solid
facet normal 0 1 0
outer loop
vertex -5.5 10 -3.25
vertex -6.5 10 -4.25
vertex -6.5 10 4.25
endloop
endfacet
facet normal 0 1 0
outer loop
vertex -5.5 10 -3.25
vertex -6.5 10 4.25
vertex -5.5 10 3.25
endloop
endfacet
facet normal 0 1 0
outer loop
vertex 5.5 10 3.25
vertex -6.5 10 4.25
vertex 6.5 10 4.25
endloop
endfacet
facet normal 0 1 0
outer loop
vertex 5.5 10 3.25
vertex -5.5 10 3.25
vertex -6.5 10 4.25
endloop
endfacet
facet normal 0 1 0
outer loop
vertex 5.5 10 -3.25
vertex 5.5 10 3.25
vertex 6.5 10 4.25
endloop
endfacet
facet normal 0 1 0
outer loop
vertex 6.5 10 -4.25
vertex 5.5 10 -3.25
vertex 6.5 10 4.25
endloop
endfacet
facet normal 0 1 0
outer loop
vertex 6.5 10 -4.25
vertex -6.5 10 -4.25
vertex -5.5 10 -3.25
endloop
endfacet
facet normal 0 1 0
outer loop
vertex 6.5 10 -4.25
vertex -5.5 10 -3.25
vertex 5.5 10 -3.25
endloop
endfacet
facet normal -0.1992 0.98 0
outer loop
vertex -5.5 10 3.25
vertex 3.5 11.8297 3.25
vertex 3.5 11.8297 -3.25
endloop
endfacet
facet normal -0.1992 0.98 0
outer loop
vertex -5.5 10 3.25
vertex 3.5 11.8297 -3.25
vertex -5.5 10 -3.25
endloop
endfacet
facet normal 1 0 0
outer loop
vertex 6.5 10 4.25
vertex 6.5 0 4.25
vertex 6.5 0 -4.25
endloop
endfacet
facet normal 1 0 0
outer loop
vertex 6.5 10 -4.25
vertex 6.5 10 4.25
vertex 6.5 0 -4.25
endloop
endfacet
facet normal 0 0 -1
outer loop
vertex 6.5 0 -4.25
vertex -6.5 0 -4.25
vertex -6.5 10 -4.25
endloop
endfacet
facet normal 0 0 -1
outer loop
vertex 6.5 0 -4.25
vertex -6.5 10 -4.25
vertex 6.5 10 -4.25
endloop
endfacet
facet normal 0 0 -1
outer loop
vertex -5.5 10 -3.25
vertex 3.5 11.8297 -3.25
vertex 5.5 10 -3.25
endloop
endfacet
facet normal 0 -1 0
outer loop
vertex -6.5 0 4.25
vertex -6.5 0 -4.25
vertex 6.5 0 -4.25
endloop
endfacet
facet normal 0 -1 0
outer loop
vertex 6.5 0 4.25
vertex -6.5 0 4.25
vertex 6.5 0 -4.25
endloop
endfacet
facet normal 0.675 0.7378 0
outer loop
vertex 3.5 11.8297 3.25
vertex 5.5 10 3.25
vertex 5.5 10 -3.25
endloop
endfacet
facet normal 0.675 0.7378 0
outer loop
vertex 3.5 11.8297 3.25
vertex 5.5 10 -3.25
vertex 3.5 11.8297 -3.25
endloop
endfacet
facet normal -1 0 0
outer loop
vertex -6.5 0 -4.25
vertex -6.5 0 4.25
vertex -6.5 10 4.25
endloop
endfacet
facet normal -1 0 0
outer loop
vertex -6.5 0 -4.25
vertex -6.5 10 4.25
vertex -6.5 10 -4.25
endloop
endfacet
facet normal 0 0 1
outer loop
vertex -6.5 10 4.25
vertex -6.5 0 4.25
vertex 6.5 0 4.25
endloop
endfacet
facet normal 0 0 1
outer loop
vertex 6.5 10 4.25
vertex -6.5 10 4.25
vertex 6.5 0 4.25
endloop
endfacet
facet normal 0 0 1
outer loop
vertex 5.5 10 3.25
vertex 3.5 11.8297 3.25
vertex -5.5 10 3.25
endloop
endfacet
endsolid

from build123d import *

# Parameters (mm, degrees)
SKETCH1_W           = 13
SKETCH1_H           = 8.5
BOSS_EXTRUDE1_DEPTH = 10
BOSS_EXTRUDE2_DEPTH = 6.5


with BuildPart() as part:
    # Sketch1 → Boss-Extrude1 (new body)
    with BuildSketch(Plane(origin=(0, 0, 0), x_dir=(1, 0, 0), z_dir=(0, 1, 0))):
        Rectangle(SKETCH1_W, SKETCH1_H)
    extrude(amount=BOSS_EXTRUDE1_DEPTH)

    # Sketch2 → Boss-Extrude2 (add)
    with BuildSketch(Plane.XY.offset(3.25)):
        Polygon((-5.5, 10), (5.5, 10), (3.5, 11.829740684), align=None)
    extrude(amount=-BOSS_EXTRUDE2_DEPTH)


solid = part.part
